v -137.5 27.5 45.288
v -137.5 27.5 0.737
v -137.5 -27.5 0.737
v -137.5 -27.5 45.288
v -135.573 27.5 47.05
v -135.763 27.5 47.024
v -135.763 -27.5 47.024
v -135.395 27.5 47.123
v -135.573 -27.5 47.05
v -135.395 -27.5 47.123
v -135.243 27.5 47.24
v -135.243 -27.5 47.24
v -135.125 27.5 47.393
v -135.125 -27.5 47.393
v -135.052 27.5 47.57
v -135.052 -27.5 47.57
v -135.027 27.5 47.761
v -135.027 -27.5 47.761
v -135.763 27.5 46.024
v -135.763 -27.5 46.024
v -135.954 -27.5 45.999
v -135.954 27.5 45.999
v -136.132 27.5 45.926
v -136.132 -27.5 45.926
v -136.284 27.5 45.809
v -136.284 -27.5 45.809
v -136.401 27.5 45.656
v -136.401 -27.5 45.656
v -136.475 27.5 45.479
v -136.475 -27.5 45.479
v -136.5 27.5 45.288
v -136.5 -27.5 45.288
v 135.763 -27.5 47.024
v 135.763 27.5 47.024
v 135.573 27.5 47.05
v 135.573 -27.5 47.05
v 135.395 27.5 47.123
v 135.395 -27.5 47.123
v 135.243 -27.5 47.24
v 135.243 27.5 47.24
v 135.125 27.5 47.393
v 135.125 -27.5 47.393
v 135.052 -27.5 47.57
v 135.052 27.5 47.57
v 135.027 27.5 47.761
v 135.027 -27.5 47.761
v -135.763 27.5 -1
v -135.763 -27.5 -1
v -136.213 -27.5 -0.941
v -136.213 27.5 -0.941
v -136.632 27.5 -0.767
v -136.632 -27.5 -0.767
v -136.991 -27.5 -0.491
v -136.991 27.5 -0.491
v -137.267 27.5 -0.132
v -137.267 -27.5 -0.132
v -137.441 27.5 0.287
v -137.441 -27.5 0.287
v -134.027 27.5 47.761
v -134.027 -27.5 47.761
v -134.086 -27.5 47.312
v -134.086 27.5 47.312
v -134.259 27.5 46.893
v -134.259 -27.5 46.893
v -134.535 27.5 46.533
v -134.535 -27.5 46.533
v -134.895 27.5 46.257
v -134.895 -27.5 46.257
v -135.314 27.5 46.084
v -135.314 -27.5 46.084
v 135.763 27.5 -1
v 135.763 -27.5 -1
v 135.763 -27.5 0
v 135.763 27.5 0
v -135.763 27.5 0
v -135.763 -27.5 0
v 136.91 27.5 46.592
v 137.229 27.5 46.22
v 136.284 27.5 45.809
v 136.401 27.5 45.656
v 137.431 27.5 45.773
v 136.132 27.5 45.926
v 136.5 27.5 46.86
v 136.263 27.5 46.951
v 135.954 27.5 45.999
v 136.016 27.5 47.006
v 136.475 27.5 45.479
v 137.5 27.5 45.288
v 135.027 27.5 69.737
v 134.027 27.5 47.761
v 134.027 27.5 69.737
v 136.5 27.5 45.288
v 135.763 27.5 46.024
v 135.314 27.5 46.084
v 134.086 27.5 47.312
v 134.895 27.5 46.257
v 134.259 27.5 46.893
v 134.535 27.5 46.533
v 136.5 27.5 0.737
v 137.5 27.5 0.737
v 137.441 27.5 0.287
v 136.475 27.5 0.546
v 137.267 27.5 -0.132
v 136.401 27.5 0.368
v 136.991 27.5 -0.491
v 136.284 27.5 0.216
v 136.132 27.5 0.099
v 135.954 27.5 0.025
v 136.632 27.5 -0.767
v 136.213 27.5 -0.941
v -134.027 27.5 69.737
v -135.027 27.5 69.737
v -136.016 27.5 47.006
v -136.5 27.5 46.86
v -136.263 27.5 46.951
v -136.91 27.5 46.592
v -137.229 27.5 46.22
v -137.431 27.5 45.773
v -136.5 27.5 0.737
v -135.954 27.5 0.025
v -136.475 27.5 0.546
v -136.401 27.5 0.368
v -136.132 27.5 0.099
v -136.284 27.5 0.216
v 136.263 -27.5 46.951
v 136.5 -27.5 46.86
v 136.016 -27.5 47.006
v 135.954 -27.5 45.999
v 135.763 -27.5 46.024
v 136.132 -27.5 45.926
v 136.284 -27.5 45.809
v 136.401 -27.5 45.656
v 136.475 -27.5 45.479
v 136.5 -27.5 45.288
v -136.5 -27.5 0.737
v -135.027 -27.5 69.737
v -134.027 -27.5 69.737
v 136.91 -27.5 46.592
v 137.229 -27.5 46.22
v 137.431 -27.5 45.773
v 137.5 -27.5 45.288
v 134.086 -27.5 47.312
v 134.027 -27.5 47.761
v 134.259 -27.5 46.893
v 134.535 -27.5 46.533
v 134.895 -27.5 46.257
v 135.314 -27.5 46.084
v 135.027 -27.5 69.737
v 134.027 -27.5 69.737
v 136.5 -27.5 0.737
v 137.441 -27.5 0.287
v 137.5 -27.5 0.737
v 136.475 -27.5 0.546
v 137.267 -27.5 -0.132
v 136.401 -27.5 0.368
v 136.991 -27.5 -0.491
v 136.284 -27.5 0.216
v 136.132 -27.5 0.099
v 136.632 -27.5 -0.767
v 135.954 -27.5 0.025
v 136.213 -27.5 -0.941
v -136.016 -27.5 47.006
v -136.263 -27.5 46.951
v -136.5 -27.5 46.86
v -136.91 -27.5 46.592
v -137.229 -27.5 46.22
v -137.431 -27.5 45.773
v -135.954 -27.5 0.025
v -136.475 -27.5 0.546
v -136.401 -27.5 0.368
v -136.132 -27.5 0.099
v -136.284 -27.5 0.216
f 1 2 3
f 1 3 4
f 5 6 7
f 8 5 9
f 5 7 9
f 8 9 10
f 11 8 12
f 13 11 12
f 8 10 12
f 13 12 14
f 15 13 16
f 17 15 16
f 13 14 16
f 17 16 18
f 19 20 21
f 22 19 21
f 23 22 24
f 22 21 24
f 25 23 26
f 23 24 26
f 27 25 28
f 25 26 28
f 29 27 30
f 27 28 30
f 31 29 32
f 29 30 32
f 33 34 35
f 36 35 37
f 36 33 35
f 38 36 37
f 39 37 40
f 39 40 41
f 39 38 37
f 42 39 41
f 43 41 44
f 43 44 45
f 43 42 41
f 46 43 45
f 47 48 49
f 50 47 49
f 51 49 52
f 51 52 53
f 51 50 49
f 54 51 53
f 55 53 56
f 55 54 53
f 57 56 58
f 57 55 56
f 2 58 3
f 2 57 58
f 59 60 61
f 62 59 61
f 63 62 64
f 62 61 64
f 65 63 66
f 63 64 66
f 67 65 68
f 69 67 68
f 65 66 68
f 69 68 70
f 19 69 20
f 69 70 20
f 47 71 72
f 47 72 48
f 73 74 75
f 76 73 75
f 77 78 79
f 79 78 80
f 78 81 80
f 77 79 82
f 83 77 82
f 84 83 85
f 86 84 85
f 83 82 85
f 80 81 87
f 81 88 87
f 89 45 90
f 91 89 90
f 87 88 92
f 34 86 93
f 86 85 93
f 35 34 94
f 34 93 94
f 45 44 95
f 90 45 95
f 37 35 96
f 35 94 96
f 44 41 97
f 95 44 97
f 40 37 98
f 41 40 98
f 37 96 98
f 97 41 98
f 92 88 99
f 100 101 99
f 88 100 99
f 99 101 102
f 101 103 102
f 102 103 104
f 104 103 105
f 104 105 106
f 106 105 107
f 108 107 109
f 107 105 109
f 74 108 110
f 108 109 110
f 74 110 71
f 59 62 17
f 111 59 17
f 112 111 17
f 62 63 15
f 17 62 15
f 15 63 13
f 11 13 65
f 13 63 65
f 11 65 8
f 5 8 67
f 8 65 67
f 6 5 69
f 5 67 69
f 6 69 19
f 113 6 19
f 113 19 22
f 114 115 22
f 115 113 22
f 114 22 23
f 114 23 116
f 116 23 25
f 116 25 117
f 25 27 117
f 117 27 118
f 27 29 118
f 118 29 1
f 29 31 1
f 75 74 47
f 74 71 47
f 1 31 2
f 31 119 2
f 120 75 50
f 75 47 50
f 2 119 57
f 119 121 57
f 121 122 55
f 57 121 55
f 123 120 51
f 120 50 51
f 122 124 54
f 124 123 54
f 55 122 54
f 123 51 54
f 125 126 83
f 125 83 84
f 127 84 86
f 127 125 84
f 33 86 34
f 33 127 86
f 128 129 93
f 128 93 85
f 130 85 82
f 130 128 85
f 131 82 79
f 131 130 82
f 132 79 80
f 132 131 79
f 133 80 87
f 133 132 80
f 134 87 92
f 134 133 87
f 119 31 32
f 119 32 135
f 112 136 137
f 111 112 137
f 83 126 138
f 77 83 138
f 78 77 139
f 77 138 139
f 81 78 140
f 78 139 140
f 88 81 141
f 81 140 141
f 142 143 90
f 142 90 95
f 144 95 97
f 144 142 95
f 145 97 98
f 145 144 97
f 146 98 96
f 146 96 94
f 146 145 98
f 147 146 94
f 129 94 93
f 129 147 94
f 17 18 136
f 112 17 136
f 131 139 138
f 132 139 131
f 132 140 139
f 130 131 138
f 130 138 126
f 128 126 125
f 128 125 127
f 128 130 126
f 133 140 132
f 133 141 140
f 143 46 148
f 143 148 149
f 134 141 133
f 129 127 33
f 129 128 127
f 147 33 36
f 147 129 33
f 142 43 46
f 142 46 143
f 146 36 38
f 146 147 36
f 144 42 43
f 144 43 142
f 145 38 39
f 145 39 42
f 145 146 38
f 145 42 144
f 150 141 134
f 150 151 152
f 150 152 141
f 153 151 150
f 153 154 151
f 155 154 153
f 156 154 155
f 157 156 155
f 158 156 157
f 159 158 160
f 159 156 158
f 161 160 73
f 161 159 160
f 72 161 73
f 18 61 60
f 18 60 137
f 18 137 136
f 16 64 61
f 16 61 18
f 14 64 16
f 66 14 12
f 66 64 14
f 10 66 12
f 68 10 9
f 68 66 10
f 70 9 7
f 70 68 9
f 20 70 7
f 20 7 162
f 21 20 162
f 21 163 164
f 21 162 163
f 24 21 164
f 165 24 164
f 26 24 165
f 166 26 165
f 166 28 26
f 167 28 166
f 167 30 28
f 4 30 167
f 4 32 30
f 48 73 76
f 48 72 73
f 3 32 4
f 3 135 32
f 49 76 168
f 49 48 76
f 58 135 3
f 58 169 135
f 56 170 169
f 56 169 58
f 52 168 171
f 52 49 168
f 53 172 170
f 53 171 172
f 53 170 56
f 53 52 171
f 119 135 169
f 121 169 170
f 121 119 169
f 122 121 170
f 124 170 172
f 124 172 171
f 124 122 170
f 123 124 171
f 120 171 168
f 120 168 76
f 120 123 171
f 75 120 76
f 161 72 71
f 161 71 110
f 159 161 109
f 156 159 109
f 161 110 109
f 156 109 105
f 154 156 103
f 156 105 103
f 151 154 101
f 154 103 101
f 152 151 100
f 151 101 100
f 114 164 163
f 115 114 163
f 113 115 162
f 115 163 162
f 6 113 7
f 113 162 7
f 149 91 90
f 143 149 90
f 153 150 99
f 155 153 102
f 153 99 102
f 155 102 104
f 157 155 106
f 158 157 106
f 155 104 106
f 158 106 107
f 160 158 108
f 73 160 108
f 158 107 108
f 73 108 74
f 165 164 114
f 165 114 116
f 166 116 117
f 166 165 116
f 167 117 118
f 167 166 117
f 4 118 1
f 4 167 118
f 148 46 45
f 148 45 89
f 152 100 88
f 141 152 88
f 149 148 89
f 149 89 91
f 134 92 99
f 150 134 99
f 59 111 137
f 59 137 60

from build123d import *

# Parameters (mm, degrees)
SKETCH_1_W                       = 137.5
SKETCH_1_H                       = 55
SM_BASE_FLANGE_1_DEPTH           = 1
SM_EDGE_FLANGE_3_STRIP_W         = 5.4732
SM_EDGE_FLANGE_3_STRIP_H         = 1
SM_EDGE_FLANGE_3_STRIP_CUT_DEPTH = 55
SM_EDGE_FLANGE_3_DEPTH           = 55
OTHER_START                      = -27.5
OTHER_1_DEPTH                    = 55
OTHER_1_2_DEPTH                  = 55


# Read off the part's stored shape, not the designer's step: Изгиб1
# Sheet-metal steps are written as plain solids
with BuildPart() as part:
    # Sketch 1 → Базовая кромка1 (new body)
    with BuildSketch(Plane.XY):
        with Locations((-68.75, 0)):
            Rectangle(SKETCH_1_W, SKETCH_1_H)
    extrude(amount=-SM_BASE_FLANGE_1_DEPTH)

    # Ребро-кромка3 strip (across the edge) → Ребро-кромка3 strip cut (cut)
    with BuildSketch(Plane(origin=(-137.5, 27.5, 0), x_dir=(1, 0, 0), z_dir=(0, -1, 0))):
        with Locations((-1, -0.5)):
            Rectangle(SM_EDGE_FLANGE_3_STRIP_W, SM_EDGE_FLANGE_3_STRIP_H)
    extrude(amount=SM_EDGE_FLANGE_3_STRIP_CUT_DEPTH, mode=Mode.SUBTRACT)

    # Ребро-кромка3 section (across the edge) → Ребро-кромка3 (add)
    with BuildSketch(Plane(origin=(-137.5, 27.5, 0), x_dir=(1, 0, 0), z_dir=(0, -1, 0))):
        with BuildLine():
            Line((0, 0.7366), (0, 69.7366))
            Line((0, 69.7366), (1, 69.7366))
            Line((1, 69.7366), (1, 0.7366))
            ThreePointArc((1, 0.7366), (1.215745145, 0.215745145), (1.7366, 0))
            Line((1.7366, 0), (1.7366, -1))
            ThreePointArc((1.7366, -1), (0.508638364, -0.491361636), (0, 0.7366))
        make_face()
    extrude(amount=SM_EDGE_FLANGE_3_DEPTH)

    # Other 1 outline → Other 1 (cut)
    with BuildSketch(Plane(origin=(0, 0, 0), x_dir=(1, 0, 0), z_dir=(0, 1, 0)).offset(OTHER_START)):
        with BuildLine():
            ThreePointArc((-136.5, -46.86049542), (-137.228828115, -46.219680493), (-137.5, -45.287854329))
            Line((-137.5, -45.287854329), (-137.5, -69.7366))
            Line((-137.5, -69.7366), (-136.5, -69.7366))
            Line((-136.5, -69.7366), (-136.5, -46.86049542))
        make_face()
    extrude(amount=OTHER_1_DEPTH, mode=Mode.SUBTRACT)

    # Other 1 2 outline → Other 1 2 (add)
    with BuildSketch(Plane(origin=(0, 0, 0), x_dir=(1, 0, 0), z_dir=(0, 1, 0)).offset(OTHER_START)):
        with BuildLine():
            Line((-136.5, -45.287854329), (-136.5, -46.86049542))
            ThreePointArc((-136.5, -46.86049542), (-136.140713558, -46.982969086), (-135.7634, -47.024454329))
            ThreePointArc((-135.7634, -47.024454329), (-135.242545145, -47.240199474), (-135.0268, -47.761054329))
            Line((-135.0268, -47.761054329), (-135.0268, -69.7366))
            Line((-135.0268, -69.7366), (-134.0268, -69.7366))
            Line((-134.0268, -69.7366), (-134.0268, -47.761054329))
            ThreePointArc((-134.0268, -47.761054329), (-134.535438364, -46.533092693), (-135.7634, -46.024454329))
            ThreePointArc((-135.7634, -46.024454329), (-136.284254855, -45.808709184), (-136.5, -45.287854329))
        make_face()
    extrude(amount=OTHER_1_2_DEPTH)

    # Зеркальное отражение1: part across plane


with BuildPart() as part_1:
    add(part.part)
    add(part.part.mirror(Plane(origin=(0, -27.5, -1), x_dir=(0, 0, 1), z_dir=(1, 0, 0))))


solid = part_1.part
